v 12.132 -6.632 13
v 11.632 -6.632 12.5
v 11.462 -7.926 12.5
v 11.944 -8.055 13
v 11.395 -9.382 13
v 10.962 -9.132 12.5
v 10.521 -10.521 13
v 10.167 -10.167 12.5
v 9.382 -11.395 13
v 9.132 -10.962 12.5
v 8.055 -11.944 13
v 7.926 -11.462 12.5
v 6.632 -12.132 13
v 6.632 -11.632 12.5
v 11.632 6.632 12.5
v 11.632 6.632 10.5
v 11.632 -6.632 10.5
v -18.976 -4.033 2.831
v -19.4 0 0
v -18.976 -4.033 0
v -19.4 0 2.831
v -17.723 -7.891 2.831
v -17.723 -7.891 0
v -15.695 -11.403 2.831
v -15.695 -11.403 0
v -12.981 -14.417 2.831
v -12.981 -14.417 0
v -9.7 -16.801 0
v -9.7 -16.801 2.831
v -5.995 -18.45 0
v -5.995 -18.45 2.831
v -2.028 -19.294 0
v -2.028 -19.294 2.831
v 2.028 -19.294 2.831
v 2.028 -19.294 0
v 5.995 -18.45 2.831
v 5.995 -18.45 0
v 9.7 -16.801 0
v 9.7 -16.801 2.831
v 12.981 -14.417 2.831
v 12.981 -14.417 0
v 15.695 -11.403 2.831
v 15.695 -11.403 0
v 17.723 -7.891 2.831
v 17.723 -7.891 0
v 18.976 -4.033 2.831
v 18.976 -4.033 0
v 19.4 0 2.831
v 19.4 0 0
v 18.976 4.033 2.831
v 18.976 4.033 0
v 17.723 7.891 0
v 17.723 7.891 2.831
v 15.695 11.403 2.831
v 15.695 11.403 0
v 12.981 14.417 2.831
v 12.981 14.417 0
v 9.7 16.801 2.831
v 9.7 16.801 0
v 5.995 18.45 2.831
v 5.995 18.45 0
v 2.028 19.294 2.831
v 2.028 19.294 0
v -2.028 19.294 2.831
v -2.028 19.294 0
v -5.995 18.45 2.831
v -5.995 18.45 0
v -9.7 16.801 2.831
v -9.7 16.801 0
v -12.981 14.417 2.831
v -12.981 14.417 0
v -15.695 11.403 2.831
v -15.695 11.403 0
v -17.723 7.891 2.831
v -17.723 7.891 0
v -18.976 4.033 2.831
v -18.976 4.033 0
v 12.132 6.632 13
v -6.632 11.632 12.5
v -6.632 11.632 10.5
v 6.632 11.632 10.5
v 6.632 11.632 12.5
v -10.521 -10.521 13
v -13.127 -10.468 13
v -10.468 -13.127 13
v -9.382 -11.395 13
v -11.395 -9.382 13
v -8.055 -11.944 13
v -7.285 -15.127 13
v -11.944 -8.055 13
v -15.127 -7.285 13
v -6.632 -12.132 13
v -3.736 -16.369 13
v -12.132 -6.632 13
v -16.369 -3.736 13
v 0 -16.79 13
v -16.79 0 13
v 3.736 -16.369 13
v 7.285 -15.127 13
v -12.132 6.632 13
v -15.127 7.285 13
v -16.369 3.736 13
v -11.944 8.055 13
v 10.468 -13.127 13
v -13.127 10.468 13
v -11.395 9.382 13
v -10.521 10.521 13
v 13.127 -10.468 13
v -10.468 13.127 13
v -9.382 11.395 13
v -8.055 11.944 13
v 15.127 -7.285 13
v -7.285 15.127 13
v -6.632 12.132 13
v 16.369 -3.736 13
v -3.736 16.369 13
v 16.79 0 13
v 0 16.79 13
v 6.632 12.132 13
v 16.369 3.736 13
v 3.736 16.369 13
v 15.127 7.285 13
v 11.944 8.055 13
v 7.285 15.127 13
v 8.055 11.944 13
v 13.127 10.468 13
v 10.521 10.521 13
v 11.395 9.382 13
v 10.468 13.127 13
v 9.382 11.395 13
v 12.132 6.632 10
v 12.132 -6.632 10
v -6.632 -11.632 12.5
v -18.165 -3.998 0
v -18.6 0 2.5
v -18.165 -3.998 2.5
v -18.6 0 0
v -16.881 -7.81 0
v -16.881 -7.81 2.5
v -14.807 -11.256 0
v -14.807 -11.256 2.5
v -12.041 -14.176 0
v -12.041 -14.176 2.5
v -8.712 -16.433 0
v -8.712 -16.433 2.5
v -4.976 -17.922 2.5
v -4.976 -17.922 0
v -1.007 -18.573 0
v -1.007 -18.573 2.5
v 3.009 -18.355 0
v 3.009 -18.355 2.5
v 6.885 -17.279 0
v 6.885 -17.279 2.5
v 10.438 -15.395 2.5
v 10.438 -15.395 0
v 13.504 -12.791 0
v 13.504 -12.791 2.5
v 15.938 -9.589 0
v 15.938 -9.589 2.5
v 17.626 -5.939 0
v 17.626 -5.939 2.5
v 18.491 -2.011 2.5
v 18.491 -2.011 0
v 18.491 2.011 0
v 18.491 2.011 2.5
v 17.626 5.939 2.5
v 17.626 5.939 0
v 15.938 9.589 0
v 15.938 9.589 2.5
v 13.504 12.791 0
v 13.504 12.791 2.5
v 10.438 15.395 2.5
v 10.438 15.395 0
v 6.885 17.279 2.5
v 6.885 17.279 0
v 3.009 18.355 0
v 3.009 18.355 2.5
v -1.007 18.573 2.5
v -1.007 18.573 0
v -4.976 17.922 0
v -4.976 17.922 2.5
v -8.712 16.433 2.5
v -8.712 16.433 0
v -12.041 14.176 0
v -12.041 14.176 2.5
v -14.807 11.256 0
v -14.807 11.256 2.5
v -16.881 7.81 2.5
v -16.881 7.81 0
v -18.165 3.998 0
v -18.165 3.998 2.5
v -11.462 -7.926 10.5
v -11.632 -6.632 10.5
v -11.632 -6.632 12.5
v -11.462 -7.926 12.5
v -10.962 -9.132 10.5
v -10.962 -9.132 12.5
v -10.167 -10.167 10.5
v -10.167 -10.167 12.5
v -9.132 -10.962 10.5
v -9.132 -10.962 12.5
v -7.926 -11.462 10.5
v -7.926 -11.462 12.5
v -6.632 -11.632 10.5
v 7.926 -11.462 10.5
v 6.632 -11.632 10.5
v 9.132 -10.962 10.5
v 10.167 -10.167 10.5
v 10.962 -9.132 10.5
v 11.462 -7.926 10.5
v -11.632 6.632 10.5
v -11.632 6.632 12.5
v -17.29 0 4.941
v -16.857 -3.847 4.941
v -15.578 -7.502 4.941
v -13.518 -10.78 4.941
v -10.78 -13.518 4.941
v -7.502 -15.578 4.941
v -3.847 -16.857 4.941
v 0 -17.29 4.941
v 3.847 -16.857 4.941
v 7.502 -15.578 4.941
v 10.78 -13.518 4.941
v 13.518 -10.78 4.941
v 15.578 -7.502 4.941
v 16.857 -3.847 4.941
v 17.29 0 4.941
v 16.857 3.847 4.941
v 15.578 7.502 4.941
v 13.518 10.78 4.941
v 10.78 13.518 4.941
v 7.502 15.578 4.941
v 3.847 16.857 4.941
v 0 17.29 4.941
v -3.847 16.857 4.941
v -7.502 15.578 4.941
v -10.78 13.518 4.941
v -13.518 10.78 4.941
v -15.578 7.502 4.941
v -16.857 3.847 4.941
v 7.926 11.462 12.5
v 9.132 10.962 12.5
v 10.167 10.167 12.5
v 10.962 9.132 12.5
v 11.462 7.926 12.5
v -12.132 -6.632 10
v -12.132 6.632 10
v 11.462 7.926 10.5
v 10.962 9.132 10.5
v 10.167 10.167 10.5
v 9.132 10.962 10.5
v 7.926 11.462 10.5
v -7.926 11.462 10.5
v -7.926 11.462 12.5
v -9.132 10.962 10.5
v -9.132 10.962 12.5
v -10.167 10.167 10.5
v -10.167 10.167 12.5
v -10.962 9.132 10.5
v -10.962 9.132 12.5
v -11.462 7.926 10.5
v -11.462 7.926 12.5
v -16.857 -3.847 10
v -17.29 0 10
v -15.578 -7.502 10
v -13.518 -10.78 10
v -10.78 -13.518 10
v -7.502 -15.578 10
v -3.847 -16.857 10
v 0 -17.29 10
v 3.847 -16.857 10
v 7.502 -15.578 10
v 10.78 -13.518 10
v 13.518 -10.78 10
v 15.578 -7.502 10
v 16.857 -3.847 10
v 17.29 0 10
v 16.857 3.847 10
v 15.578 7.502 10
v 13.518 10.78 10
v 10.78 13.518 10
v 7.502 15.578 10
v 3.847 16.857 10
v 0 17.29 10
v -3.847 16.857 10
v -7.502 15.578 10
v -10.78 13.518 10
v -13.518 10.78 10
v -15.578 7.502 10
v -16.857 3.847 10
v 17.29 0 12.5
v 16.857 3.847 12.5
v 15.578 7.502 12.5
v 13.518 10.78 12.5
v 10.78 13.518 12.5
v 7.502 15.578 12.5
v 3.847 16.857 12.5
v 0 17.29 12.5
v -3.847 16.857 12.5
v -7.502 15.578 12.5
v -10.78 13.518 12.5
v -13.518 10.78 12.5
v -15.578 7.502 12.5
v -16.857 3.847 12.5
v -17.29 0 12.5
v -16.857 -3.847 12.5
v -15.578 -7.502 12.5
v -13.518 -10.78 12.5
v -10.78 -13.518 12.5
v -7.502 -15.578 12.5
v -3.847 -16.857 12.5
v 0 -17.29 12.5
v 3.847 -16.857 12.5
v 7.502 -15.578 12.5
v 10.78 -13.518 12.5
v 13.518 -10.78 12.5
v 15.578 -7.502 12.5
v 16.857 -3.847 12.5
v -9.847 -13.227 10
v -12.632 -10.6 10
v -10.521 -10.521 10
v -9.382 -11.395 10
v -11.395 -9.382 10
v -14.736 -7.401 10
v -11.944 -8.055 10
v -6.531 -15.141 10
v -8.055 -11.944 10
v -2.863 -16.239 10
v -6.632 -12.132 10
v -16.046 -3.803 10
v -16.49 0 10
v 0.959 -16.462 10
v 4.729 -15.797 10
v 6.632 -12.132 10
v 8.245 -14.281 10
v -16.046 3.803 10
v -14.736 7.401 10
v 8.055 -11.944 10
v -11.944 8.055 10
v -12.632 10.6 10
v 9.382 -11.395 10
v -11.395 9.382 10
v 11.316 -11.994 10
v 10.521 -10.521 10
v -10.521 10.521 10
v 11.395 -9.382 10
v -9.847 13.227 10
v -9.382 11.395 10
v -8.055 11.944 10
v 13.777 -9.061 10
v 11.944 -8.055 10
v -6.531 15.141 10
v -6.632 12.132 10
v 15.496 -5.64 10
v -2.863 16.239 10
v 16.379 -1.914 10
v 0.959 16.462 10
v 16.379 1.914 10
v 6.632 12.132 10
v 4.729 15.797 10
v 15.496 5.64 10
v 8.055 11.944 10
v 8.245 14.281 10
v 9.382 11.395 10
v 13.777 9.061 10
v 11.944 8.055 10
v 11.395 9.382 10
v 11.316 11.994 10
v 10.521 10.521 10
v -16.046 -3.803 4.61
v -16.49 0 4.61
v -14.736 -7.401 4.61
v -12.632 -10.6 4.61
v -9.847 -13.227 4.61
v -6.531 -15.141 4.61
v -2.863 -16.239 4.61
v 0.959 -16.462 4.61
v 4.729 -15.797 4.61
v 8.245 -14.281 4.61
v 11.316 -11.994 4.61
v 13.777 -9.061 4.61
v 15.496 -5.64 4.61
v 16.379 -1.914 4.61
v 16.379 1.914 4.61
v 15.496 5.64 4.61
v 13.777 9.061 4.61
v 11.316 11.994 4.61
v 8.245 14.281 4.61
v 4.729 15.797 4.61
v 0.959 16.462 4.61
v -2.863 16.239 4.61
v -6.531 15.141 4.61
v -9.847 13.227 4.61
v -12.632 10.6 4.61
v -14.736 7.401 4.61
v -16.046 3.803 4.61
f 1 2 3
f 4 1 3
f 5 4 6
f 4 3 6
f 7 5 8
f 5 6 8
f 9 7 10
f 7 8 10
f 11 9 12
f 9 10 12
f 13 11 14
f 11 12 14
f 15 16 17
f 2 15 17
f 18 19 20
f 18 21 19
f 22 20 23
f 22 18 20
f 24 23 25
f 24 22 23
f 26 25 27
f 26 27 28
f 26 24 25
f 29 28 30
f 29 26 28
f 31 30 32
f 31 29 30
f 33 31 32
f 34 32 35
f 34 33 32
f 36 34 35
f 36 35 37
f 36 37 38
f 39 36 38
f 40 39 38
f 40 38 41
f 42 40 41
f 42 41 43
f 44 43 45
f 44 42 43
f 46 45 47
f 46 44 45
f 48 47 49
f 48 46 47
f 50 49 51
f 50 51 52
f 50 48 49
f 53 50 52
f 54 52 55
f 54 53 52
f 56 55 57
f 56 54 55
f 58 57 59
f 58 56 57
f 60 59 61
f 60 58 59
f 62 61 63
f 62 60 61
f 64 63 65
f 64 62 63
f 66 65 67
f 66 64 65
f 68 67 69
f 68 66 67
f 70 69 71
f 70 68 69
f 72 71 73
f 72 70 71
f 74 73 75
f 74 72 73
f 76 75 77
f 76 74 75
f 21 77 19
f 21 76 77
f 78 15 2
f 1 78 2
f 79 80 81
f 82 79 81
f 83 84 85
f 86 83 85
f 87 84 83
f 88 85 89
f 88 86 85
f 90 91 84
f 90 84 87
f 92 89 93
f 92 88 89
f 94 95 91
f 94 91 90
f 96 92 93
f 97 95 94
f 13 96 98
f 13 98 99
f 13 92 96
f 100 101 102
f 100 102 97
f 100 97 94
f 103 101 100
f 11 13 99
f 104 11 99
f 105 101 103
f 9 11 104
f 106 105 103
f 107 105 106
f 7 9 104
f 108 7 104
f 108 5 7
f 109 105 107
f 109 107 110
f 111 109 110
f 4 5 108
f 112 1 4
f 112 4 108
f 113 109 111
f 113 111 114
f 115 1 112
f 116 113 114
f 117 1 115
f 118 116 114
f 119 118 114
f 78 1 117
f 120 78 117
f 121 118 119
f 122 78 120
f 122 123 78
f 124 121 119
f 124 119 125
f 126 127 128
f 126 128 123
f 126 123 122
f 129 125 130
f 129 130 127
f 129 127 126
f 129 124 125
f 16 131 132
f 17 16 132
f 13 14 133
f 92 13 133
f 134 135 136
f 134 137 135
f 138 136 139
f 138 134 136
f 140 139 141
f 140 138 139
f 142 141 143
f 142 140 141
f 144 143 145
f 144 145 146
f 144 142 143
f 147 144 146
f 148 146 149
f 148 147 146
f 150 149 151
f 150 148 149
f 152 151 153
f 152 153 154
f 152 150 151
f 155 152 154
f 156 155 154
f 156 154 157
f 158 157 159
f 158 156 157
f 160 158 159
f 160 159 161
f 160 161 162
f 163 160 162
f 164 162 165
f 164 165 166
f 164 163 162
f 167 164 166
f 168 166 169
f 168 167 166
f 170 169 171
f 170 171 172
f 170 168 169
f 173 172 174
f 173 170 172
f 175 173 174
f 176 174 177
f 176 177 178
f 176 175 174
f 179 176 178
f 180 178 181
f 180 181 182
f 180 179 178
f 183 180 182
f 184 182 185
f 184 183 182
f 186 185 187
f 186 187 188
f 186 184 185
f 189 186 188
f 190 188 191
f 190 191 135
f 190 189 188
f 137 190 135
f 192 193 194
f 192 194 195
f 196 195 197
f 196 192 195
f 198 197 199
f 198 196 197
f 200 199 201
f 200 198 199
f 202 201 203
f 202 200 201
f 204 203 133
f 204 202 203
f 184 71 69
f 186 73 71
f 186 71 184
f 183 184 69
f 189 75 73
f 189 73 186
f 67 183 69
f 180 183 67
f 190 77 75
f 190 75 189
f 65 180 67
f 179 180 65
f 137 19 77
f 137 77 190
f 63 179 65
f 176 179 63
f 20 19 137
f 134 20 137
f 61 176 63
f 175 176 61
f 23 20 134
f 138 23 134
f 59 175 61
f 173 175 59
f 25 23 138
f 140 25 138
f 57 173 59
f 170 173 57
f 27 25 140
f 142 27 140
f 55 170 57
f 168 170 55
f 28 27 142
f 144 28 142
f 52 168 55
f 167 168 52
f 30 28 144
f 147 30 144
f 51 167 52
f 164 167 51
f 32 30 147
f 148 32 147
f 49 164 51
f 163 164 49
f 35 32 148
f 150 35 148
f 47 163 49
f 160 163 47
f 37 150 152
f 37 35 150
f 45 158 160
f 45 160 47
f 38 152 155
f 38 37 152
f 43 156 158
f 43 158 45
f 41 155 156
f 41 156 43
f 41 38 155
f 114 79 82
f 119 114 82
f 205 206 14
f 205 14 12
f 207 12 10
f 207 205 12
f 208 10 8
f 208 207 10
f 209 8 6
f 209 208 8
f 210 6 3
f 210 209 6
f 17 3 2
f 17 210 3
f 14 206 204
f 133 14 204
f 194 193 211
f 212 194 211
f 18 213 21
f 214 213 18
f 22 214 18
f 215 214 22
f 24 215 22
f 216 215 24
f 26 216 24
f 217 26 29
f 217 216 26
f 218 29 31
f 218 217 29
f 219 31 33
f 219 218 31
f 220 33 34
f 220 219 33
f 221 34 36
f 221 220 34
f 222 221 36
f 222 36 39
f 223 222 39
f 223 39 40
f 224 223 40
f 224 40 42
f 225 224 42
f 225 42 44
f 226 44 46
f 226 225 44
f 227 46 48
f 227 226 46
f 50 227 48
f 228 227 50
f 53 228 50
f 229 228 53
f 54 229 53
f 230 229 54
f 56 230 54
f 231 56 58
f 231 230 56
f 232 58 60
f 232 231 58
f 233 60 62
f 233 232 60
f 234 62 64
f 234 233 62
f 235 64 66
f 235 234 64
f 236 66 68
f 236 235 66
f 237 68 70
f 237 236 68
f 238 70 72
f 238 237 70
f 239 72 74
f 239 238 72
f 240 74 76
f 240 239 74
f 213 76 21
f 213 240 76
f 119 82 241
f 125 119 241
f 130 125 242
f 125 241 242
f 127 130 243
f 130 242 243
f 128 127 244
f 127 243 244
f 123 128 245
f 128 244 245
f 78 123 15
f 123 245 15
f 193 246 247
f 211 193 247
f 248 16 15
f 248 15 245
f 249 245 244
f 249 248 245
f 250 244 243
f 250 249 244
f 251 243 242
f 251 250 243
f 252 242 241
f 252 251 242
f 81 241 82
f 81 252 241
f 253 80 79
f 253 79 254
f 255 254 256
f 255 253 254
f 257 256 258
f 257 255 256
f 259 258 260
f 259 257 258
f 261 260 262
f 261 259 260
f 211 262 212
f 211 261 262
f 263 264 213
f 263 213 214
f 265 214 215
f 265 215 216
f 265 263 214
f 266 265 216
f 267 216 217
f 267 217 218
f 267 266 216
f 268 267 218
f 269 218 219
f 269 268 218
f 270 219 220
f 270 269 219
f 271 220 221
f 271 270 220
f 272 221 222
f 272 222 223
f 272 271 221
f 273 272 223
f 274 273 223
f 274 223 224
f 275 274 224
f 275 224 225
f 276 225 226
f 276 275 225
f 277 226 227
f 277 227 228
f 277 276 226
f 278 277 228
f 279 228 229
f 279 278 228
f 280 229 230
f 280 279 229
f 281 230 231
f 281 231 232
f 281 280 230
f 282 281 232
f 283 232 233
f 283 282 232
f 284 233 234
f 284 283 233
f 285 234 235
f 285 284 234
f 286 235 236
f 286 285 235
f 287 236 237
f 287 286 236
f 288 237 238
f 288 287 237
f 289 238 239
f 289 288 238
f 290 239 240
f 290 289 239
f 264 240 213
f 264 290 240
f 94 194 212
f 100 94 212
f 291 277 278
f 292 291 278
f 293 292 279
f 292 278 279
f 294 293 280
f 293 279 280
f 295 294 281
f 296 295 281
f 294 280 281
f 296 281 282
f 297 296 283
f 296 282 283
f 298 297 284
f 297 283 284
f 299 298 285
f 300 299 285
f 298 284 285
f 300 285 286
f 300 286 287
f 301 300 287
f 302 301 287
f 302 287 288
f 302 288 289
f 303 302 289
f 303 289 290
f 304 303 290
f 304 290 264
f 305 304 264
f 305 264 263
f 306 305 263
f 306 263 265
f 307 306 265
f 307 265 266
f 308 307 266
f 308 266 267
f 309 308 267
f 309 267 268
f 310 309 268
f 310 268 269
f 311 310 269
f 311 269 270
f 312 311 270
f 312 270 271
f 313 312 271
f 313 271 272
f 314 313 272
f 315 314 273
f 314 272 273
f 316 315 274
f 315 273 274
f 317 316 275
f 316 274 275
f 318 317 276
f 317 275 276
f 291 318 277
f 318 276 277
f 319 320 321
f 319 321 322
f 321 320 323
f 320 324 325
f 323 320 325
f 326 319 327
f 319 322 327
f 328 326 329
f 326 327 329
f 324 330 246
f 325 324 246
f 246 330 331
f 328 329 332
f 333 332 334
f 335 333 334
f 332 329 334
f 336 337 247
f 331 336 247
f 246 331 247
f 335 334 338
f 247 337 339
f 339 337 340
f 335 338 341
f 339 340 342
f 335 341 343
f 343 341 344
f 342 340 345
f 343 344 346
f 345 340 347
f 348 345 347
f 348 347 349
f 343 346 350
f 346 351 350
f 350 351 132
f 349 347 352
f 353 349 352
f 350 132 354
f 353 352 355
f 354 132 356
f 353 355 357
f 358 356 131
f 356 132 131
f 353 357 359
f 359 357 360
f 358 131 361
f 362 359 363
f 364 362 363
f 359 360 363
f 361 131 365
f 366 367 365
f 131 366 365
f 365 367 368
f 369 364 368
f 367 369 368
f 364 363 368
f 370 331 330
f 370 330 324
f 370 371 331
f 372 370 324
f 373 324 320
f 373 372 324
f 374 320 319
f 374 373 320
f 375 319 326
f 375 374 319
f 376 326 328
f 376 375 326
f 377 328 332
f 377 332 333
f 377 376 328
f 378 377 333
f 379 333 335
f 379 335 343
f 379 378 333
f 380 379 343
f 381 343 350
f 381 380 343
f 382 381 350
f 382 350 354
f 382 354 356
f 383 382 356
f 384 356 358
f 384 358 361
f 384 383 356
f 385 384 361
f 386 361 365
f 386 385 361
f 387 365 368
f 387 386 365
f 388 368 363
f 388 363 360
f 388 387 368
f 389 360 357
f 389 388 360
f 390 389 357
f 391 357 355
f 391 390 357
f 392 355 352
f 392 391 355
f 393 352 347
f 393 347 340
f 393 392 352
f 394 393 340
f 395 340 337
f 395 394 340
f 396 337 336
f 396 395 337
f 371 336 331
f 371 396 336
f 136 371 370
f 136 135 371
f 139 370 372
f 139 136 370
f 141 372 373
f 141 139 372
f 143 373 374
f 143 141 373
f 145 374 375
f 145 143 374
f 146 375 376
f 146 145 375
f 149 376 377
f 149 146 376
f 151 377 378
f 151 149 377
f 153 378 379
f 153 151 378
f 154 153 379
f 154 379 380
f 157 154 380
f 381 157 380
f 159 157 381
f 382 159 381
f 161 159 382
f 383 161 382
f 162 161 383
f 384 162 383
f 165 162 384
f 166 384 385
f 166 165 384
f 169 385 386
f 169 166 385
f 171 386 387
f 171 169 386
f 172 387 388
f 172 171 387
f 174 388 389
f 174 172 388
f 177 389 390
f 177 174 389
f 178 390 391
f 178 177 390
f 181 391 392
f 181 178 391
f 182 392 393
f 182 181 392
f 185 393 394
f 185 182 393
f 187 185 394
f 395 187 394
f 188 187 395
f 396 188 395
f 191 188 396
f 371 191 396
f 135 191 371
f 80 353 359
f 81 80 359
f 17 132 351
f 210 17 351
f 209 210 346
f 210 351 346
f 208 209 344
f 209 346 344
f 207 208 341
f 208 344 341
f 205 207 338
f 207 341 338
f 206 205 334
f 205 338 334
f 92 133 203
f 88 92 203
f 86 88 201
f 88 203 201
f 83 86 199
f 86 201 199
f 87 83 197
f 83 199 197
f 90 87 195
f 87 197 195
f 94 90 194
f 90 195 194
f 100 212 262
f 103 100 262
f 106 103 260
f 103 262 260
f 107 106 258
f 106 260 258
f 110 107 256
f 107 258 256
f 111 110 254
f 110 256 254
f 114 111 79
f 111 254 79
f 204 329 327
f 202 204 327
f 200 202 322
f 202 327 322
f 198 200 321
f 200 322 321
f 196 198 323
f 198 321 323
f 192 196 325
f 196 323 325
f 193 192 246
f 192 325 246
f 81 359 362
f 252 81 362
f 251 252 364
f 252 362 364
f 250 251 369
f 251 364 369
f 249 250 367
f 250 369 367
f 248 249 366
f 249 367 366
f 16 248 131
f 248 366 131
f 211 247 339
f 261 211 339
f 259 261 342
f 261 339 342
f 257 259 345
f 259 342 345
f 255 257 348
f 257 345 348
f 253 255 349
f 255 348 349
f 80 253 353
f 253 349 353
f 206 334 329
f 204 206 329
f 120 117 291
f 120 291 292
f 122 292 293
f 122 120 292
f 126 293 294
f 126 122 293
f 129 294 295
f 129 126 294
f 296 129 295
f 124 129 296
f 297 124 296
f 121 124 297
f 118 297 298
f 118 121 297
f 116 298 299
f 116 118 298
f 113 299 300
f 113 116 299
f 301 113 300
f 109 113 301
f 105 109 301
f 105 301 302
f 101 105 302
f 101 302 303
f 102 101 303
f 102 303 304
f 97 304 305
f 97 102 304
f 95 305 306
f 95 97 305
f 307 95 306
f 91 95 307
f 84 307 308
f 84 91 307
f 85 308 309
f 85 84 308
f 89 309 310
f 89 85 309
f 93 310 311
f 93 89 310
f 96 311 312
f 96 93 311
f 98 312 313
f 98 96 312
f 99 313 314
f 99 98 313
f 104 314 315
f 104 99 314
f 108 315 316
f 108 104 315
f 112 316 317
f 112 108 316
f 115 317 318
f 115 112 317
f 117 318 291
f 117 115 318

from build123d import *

# Parameters (mm, degrees)
SKETCH001_R  = 17.29
PAD_DEPTH    = 3
CHAMFER_SIZE = 0.5


with BuildPart() as part:
    # Sketch → Revolution (revolve)
    with BuildSketch(Plane.XZ):
        Polygon((-19.4, 0), (-19.4, 2.831371), (-17.29, 4.941371), (-17.29, 10), (-16.49, 10), (-16.49, 4.61), (-18.6, 2.5), (-18.6, 0), align=None)
    revolve(axis=Axis((0, 0, 0), (0, 0, 1)))

    # Sketch001 (on DatumPlane) → Pad (new body)
    with BuildSketch(Plane.XY.offset(10)):
        Circle(SKETCH001_R)
        with BuildLine():
            ThreePointArc((-6.631907, 11.631907), (-10.16744, 10.16744), (-11.631907, 6.631907))
            Line((-11.631907, -6.631907), (-11.631907, 6.631907))
            ThreePointArc((-11.631907, -6.631907), (-10.16744, -10.16744), (-6.631907, -11.631907))
            Line((6.631907, -11.631907), (-6.631907, -11.631907))
            ThreePointArc((6.631907, -11.631907), (10.16744, -10.16744), (11.631907, -6.631907))
            Line((11.631907, 6.631907), (11.631907, -6.631907))
            ThreePointArc((11.631907, 6.631907), (10.16744, 10.16744), (6.631907, 11.631907))
            Line((-6.631907, 11.631907), (6.631907, 11.631907))
        make_face(mode=Mode.SUBTRACT)
    extrude(amount=PAD_DEPTH)

    # Chamfer
    chamfer_edges = [part.edges().sort_by_distance(p)[0] for p in [
        (0, -11.631907, 10),
        (10.16744, -10.16744, 10),
        (-10.16744, -10.16744, 10),
        (-11.631907, 0, 10),
        (11.631907, 0, 10),
        (10.16744, 10.16744, 10),
        (0, 11.631907, 10),
        (-10.16744, 10.16744, 10),
        (0, -11.631907, 13),
        (10.16744, -10.16744, 13),
        (11.631907, 0, 13),
        (10.16744, 10.16744, 13),
        (0, 11.631907, 13),
        (-10.16744, 10.16744, 13),
        (-11.631907, 0, 13),
        (-10.16744, -10.16744, 13),
        (0, 17.29, 13),
        (0, -17.29, 13),
    ]]
    chamfer(chamfer_edges, length=CHAMFER_SIZE)


solid = part.part
